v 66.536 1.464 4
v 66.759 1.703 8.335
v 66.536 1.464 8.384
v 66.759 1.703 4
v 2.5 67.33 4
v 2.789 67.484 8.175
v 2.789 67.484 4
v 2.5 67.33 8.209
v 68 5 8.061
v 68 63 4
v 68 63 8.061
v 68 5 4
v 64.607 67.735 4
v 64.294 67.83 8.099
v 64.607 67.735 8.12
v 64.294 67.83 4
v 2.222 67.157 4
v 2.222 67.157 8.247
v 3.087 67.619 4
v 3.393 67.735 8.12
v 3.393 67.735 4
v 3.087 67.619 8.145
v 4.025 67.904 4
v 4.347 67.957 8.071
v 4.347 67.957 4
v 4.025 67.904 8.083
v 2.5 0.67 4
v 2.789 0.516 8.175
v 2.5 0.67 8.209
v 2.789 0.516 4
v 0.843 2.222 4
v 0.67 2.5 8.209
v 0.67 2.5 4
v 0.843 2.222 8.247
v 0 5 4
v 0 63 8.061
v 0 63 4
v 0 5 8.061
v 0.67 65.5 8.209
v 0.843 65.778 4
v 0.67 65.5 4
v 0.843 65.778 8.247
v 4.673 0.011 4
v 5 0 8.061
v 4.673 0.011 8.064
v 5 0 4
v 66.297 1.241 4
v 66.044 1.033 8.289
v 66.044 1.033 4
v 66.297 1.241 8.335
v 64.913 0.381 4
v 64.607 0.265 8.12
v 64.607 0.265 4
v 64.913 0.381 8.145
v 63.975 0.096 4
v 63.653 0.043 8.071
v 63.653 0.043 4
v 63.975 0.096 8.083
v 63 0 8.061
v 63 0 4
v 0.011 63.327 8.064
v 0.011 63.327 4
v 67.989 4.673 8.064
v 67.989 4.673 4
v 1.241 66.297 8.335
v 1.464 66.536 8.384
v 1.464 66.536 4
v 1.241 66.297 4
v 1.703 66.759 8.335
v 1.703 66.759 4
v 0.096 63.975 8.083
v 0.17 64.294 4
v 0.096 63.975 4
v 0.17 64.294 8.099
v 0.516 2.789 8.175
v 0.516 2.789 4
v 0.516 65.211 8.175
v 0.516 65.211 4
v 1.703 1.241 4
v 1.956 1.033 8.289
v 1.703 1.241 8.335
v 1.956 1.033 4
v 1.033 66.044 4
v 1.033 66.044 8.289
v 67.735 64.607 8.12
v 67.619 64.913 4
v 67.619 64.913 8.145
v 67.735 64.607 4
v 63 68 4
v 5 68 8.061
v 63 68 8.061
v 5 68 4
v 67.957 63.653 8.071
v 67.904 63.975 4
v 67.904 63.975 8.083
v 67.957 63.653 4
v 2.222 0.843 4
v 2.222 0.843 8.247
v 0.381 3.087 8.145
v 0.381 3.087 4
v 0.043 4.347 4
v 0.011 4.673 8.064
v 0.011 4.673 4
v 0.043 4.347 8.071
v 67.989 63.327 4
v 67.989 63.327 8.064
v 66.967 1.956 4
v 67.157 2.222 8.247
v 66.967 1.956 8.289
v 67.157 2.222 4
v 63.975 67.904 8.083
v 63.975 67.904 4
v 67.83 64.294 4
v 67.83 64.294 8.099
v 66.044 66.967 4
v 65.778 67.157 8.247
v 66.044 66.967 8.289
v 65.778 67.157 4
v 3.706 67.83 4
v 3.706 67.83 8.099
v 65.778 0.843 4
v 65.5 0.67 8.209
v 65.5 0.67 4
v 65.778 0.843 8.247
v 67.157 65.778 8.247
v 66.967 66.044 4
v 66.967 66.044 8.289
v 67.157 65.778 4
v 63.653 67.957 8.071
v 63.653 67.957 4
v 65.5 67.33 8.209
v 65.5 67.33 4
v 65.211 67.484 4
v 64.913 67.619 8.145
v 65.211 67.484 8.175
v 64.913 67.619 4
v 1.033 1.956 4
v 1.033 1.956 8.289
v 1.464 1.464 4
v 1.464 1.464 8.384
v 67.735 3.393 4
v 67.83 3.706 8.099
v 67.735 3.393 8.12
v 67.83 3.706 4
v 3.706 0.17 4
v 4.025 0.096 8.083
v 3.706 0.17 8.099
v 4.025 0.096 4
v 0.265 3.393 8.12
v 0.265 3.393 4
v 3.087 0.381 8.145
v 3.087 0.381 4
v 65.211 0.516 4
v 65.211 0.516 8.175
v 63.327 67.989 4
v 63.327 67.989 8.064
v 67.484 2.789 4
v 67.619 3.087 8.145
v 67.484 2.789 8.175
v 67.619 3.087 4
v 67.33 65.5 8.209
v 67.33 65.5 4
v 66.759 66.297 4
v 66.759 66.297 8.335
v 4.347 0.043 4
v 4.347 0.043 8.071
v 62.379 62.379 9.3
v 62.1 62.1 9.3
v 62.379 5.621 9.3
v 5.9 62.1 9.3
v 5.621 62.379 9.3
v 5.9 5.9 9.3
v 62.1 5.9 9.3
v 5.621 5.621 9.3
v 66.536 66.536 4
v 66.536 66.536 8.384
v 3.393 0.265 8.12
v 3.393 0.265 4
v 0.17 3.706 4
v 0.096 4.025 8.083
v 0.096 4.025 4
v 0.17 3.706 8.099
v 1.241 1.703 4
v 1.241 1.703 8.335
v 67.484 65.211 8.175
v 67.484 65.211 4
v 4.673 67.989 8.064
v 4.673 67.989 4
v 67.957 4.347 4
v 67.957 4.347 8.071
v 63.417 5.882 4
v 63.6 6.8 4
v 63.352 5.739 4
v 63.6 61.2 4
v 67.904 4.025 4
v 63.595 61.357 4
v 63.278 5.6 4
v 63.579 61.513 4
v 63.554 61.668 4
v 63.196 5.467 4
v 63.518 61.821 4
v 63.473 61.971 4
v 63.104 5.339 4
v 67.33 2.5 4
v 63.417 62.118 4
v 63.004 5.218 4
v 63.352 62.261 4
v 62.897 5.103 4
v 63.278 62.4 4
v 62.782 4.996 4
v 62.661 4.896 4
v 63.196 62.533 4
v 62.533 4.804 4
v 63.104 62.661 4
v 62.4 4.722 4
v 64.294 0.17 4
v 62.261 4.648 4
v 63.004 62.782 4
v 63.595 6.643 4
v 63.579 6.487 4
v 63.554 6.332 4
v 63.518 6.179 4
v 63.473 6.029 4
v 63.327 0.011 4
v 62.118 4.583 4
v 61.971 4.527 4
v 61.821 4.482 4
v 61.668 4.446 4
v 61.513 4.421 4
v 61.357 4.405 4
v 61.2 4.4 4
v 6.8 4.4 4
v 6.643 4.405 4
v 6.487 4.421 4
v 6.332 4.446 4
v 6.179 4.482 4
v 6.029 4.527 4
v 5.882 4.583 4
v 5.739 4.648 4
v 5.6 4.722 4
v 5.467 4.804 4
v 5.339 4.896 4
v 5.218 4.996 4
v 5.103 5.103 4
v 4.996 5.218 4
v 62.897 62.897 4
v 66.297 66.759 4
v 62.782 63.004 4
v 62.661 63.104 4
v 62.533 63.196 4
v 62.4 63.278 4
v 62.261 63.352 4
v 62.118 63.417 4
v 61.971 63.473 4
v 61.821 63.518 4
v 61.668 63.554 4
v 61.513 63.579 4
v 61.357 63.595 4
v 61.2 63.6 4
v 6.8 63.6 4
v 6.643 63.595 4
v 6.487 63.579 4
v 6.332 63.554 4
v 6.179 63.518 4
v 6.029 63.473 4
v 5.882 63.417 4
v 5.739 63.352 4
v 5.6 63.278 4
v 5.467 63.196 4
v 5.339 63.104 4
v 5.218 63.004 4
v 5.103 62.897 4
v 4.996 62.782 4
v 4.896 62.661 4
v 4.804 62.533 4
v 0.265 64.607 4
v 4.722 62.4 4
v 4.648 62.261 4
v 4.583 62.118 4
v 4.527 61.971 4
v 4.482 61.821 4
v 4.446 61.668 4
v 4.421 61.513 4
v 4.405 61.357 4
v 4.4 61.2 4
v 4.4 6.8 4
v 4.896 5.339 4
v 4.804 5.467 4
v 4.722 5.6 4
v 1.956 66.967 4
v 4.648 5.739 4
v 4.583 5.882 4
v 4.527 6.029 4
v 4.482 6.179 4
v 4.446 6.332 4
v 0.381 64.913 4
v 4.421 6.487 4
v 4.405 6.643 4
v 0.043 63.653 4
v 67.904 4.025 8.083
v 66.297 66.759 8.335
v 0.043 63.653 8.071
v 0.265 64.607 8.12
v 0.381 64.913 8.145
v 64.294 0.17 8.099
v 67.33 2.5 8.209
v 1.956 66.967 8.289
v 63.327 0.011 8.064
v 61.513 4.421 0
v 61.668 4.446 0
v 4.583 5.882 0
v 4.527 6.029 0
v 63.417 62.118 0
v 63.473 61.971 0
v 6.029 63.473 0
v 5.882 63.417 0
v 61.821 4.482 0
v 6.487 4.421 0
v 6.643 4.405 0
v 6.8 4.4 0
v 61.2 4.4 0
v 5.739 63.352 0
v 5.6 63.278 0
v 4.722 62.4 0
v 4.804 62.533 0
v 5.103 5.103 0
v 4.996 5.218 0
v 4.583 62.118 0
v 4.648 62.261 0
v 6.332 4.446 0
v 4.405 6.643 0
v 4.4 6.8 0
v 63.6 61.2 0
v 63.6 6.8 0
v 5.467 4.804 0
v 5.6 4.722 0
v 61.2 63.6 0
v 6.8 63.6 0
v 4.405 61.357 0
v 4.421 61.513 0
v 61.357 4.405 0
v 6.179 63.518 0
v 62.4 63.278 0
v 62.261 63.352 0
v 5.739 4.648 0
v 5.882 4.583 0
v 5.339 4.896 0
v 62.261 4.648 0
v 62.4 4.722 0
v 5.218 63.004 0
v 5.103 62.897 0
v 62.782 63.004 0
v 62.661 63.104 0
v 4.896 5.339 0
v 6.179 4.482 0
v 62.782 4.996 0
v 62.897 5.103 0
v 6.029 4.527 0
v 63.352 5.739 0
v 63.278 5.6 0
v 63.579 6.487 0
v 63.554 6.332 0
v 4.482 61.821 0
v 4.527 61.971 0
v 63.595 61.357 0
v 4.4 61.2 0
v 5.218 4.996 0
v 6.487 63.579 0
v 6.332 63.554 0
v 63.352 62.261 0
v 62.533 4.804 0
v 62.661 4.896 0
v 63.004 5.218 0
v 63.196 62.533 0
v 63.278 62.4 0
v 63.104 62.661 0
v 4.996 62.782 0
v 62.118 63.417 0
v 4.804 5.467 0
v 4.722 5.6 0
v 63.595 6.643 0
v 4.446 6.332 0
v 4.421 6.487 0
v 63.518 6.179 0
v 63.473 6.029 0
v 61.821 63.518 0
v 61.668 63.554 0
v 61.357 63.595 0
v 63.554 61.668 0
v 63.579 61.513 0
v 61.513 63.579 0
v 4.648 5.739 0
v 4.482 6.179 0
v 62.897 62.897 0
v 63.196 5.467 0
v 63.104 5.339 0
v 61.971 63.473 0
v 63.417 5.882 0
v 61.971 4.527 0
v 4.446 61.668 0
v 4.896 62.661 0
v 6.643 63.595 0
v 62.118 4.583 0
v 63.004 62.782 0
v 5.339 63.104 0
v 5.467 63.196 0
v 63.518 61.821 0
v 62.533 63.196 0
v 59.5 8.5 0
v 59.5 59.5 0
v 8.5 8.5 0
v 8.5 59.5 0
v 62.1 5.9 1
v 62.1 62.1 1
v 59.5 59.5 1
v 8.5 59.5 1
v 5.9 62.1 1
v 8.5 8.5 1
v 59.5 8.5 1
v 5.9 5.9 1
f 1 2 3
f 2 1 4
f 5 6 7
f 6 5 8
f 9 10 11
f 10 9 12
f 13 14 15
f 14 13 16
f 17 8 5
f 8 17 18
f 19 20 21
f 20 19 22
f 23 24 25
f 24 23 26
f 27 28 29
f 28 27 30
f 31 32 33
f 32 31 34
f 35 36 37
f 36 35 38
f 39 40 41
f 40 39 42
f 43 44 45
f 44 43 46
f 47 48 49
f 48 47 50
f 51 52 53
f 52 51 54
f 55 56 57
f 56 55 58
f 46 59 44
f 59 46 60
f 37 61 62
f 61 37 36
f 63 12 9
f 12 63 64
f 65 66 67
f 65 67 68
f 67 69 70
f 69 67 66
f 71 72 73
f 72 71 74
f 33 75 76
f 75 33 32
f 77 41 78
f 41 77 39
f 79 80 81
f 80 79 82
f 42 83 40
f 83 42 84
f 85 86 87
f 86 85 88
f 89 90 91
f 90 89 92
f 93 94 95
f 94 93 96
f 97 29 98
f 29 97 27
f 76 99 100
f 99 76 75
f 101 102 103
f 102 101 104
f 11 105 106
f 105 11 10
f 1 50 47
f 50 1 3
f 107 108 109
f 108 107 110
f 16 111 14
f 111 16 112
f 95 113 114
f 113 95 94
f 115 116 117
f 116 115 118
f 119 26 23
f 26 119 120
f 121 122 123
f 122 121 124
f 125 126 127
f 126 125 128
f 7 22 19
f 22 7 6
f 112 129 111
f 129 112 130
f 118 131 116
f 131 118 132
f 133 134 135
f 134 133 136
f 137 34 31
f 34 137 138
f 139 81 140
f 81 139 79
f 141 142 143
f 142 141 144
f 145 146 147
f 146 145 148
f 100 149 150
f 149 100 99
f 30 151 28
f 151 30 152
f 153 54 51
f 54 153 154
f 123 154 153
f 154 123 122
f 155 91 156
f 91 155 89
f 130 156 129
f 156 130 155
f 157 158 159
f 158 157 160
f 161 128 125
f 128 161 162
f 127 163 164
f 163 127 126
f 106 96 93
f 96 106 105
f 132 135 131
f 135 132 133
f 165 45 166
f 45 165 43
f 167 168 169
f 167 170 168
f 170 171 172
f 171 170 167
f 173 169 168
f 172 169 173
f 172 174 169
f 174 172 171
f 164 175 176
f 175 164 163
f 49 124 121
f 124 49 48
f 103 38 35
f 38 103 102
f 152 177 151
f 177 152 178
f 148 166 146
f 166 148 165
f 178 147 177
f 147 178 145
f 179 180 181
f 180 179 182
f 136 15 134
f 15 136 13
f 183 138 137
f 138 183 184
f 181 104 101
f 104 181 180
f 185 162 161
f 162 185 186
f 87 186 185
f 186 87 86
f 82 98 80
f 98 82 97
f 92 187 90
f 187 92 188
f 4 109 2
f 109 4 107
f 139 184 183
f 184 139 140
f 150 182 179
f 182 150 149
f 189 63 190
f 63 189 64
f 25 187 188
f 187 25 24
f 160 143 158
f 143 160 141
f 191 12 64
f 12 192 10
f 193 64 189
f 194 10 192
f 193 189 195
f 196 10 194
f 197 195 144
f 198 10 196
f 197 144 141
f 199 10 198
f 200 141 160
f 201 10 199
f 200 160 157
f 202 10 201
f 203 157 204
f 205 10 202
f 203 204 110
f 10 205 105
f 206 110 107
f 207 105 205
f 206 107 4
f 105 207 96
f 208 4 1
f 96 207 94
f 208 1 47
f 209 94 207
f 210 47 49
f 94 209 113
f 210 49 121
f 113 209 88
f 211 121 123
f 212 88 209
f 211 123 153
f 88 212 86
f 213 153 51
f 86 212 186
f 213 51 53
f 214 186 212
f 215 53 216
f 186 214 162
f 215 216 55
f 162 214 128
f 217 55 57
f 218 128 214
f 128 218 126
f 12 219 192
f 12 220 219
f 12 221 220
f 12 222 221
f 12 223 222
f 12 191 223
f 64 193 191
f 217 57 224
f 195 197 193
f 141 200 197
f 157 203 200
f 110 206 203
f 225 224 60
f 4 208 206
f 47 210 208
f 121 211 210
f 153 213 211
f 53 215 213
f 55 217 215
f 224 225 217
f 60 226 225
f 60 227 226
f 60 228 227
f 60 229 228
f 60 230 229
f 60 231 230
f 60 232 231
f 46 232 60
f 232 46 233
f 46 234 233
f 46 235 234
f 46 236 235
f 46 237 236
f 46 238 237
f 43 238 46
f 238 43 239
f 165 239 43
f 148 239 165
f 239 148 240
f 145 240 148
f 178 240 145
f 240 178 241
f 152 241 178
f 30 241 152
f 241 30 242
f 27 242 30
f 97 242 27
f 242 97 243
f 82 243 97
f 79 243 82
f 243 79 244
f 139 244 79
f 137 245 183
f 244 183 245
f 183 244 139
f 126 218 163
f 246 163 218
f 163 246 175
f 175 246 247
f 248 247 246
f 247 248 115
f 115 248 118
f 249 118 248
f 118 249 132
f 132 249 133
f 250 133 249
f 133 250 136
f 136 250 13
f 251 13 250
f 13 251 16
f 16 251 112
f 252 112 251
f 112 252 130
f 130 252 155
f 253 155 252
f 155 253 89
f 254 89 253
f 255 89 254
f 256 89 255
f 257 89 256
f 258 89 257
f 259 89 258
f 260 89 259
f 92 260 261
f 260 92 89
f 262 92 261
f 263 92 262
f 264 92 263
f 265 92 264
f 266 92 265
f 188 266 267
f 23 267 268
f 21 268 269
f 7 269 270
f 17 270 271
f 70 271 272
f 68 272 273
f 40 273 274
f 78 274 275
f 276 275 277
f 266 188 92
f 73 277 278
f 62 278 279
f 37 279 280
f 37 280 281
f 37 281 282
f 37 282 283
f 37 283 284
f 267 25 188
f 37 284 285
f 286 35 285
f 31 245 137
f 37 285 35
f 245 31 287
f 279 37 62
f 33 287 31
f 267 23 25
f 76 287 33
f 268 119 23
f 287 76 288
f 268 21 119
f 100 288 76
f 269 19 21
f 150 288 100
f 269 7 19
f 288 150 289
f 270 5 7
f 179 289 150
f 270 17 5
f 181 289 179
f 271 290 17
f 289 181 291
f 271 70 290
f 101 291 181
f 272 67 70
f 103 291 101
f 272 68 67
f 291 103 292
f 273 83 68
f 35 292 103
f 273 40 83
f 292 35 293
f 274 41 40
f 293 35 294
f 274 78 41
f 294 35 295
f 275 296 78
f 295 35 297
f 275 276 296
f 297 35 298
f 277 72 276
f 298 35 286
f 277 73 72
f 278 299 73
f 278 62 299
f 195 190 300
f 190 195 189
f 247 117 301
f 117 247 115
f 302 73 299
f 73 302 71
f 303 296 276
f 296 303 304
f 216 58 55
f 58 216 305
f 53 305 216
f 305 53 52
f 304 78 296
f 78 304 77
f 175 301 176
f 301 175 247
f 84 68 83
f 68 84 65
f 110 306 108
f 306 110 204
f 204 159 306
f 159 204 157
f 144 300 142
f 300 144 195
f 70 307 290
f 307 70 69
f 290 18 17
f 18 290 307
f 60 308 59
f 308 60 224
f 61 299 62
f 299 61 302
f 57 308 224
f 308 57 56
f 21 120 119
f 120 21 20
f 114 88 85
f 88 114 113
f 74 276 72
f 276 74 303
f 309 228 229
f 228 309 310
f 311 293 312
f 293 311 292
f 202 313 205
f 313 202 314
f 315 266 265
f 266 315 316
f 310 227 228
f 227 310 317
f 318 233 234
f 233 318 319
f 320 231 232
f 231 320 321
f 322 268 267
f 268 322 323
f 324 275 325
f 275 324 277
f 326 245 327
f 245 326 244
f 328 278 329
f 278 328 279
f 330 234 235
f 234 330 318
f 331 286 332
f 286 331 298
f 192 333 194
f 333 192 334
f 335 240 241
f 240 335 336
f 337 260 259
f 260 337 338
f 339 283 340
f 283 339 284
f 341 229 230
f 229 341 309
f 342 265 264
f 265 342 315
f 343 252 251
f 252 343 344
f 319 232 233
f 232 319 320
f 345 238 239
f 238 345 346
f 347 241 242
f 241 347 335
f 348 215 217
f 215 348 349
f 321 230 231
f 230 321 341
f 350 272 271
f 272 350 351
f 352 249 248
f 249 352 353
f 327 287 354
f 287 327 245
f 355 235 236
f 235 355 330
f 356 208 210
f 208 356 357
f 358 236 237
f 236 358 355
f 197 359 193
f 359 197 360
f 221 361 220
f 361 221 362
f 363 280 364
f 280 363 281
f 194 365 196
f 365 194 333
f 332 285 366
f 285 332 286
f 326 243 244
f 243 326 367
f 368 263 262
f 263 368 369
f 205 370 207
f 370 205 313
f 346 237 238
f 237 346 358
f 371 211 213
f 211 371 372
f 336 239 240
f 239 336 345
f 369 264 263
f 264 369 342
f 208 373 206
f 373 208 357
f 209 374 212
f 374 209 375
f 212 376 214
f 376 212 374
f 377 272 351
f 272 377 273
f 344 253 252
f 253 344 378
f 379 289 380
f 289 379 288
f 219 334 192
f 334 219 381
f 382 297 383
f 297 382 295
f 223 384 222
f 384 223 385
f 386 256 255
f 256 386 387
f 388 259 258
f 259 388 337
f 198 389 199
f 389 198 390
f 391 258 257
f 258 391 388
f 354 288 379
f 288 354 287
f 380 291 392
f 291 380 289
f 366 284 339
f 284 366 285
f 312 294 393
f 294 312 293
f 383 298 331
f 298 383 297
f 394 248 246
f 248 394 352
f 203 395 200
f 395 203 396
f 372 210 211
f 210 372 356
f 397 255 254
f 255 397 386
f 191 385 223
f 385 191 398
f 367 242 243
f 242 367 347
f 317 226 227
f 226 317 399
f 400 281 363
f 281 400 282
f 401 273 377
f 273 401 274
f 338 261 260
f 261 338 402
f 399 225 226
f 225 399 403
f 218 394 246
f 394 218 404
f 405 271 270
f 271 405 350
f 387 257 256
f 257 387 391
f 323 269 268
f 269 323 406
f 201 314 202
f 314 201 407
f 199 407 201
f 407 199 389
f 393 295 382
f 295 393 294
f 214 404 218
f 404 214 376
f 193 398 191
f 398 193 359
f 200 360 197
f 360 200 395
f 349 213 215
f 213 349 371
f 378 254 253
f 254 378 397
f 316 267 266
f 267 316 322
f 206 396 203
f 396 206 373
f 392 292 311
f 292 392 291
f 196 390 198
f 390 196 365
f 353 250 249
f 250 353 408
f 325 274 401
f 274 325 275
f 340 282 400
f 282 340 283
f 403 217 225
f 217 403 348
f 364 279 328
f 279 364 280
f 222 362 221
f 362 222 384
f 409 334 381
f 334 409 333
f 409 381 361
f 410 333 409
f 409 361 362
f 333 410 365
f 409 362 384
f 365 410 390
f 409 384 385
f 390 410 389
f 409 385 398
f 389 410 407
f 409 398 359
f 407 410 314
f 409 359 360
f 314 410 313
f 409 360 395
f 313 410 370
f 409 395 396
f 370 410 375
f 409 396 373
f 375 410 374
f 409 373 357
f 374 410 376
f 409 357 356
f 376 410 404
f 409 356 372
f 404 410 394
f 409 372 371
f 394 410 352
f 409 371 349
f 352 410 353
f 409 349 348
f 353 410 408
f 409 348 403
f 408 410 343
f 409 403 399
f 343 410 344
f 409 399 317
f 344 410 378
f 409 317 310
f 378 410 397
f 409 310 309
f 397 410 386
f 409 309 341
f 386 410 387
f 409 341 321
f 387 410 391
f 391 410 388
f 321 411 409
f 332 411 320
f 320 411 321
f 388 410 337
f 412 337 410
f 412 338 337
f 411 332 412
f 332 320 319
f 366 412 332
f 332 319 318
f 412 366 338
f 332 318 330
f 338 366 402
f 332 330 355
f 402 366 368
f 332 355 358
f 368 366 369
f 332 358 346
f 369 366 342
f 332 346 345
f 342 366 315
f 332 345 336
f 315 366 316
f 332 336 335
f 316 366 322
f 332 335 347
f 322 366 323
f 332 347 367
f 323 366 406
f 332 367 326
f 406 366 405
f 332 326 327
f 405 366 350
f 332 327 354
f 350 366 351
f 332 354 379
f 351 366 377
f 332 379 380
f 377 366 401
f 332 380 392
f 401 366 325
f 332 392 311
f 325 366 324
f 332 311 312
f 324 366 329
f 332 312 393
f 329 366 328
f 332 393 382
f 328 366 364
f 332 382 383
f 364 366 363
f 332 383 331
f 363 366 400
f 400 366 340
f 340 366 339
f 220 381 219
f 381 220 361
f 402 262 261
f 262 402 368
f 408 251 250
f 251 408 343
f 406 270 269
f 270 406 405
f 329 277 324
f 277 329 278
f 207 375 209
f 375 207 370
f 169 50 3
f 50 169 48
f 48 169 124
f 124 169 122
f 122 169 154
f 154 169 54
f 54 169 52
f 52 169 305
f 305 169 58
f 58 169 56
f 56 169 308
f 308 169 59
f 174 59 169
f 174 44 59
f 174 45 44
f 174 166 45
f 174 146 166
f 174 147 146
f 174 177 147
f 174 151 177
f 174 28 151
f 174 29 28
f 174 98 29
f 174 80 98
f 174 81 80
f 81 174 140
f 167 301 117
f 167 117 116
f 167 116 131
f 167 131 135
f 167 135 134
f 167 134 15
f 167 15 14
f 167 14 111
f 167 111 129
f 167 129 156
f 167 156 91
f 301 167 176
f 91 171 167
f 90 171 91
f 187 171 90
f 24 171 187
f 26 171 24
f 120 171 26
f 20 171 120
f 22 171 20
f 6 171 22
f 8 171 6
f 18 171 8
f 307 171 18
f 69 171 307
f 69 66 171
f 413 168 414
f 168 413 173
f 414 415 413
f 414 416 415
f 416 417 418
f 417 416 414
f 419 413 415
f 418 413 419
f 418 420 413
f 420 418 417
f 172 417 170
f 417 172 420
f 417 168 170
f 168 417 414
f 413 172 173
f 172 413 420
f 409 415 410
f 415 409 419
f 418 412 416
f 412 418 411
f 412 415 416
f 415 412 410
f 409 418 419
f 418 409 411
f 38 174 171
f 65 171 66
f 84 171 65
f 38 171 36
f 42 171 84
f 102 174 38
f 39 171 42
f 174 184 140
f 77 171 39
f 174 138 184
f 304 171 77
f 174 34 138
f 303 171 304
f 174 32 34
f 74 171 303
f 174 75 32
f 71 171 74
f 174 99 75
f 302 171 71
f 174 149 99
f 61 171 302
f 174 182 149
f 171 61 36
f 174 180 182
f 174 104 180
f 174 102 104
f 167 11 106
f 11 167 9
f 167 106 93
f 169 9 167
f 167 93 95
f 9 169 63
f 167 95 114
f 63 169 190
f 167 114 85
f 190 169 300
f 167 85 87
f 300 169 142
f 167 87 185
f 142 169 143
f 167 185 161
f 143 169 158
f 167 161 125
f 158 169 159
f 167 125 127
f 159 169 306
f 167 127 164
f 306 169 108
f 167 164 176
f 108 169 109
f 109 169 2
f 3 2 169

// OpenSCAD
/* [Cover] */

// Cover width and length
cover = 68;

// Total height from the steel part of the outlet to the top of the cover
cover_height = 8;

// Cover corner radius
cover_radius = 5;

// Border radius for the smaller bottom part
cover_bottom_radius = 2.4;

// Cover lip width
cover_lip_width = 4.4;

// Distance from bottom to lip
cover_lip_distance = 4;

// 55 bottom lip
wall_width = 1;

/* [55 cutout] */

// Cutout width/length
cutout_55 = 56.2;

// Needed height for your 55 cover, eg height of the outlet cover. 7.6 can be used for normal outlets, 8.3 for usb charger outlet.
cutout_55_height = 8.3; //7.6; //

// The coutout width/length for the lip below the 55 cutout
cutout_55_inner = 51;


/* [Misc] */

// Resolution
$fn=96;

// Avoid artifacts
clearance = 0.001;


///////////////////////
// Calculated values //
///////////////////////

total_height = wall_width + cutout_55_height;
cover_thickness = total_height - cover_lip_distance;
border_width = (cover - cutout_55) / 2;
slope_cut_degres = atan((total_height - cover_height) / border_width);


///////////
// Build //
///////////

difference () {

    union() {
        
        // Cover
        translate([
            0,
            0,
            cover_lip_distance
        ]) {
            roundedRectangle(
                cover,
                cover,
                cover_thickness,
                cover_radius
            );
        }
        
        // Base
        translate([cover_lip_width,cover_lip_width,0]) {
            roundedRectangle(
                cover-2*cover_lip_width,
                cover-2*cover_lip_width,
                cover_lip_distance,
                cover_bottom_radius
            );
        }
    }

    // Inner 55 cutout
    translate([
        (cover-cutout_55)/2,
        (cover-cutout_55)/2,
        wall_width]
    ) {
        cube([
            cutout_55,
            cutout_55,
            cutout_55_height+clearance
        ]);
    }

    // Inner lip cutout
    translate([
        (cover-cutout_55_inner)/2,
        (cover-cutout_55_inner)/2,
        -clearance]
    ) {
        cube([
            cutout_55_inner,
            cutout_55_inner,
            wall_width+2*clearance
        ]);
    }

    // Sloped cuts for lage 55 covers

    // Left 
    translate([
        -0.6,
        -clearance,
        wall_width+cutout_55_height-tan(slope_cut_degres)*border_width/2
    ]) {
        sloped_cut(-slope_cut_degres);
    }

    // Right
    translate([
        cover-(cover-cutout_55)/2+0.6,
        0,
        wall_width+cutout_55_height-tan(slope_cut_degres)*border_width/2
    ]) {
        sloped_cut(slope_cut_degres);
    }

    rotate(90, [0,0,1]) {
        
        // Bottom
        translate([
            -0.6,
            -cover-clearance,
            wall_width+cutout_55_height-tan(slope_cut_degres)*border_width/2
        ]) {
            sloped_cut(-slope_cut_degres);
        }

        // Top
        translate([
            cover-(cover-cutout_55)/2+0.6,
            -cover,
            wall_width+cutout_55_height-tan(slope_cut_degres)*border_width/2
        ]) {
            sloped_cut(slope_cut_degres);
        }
    }
}

module roundedRectangle(width, depth, height, radius, center=false) {
    translate([radius,radius,0]) {
        minkowski() {
            cube([width-2*radius,depth-2*radius,height/2], center=center);
            cylinder(r=radius,h=height/2);
        }
    }
}

module sloped_cut(deg) {
    translate([
        (cover-cutout_55)/4,
        cover/2,
        (cover-cutout_55)/4
    ]) {
        rotate(deg, [0,1,0]) {
            cube([
                cover,
                cover+2*clearance,
                (cover-cutout_55)/2
            ], center=true);
        }
    }
}
    
